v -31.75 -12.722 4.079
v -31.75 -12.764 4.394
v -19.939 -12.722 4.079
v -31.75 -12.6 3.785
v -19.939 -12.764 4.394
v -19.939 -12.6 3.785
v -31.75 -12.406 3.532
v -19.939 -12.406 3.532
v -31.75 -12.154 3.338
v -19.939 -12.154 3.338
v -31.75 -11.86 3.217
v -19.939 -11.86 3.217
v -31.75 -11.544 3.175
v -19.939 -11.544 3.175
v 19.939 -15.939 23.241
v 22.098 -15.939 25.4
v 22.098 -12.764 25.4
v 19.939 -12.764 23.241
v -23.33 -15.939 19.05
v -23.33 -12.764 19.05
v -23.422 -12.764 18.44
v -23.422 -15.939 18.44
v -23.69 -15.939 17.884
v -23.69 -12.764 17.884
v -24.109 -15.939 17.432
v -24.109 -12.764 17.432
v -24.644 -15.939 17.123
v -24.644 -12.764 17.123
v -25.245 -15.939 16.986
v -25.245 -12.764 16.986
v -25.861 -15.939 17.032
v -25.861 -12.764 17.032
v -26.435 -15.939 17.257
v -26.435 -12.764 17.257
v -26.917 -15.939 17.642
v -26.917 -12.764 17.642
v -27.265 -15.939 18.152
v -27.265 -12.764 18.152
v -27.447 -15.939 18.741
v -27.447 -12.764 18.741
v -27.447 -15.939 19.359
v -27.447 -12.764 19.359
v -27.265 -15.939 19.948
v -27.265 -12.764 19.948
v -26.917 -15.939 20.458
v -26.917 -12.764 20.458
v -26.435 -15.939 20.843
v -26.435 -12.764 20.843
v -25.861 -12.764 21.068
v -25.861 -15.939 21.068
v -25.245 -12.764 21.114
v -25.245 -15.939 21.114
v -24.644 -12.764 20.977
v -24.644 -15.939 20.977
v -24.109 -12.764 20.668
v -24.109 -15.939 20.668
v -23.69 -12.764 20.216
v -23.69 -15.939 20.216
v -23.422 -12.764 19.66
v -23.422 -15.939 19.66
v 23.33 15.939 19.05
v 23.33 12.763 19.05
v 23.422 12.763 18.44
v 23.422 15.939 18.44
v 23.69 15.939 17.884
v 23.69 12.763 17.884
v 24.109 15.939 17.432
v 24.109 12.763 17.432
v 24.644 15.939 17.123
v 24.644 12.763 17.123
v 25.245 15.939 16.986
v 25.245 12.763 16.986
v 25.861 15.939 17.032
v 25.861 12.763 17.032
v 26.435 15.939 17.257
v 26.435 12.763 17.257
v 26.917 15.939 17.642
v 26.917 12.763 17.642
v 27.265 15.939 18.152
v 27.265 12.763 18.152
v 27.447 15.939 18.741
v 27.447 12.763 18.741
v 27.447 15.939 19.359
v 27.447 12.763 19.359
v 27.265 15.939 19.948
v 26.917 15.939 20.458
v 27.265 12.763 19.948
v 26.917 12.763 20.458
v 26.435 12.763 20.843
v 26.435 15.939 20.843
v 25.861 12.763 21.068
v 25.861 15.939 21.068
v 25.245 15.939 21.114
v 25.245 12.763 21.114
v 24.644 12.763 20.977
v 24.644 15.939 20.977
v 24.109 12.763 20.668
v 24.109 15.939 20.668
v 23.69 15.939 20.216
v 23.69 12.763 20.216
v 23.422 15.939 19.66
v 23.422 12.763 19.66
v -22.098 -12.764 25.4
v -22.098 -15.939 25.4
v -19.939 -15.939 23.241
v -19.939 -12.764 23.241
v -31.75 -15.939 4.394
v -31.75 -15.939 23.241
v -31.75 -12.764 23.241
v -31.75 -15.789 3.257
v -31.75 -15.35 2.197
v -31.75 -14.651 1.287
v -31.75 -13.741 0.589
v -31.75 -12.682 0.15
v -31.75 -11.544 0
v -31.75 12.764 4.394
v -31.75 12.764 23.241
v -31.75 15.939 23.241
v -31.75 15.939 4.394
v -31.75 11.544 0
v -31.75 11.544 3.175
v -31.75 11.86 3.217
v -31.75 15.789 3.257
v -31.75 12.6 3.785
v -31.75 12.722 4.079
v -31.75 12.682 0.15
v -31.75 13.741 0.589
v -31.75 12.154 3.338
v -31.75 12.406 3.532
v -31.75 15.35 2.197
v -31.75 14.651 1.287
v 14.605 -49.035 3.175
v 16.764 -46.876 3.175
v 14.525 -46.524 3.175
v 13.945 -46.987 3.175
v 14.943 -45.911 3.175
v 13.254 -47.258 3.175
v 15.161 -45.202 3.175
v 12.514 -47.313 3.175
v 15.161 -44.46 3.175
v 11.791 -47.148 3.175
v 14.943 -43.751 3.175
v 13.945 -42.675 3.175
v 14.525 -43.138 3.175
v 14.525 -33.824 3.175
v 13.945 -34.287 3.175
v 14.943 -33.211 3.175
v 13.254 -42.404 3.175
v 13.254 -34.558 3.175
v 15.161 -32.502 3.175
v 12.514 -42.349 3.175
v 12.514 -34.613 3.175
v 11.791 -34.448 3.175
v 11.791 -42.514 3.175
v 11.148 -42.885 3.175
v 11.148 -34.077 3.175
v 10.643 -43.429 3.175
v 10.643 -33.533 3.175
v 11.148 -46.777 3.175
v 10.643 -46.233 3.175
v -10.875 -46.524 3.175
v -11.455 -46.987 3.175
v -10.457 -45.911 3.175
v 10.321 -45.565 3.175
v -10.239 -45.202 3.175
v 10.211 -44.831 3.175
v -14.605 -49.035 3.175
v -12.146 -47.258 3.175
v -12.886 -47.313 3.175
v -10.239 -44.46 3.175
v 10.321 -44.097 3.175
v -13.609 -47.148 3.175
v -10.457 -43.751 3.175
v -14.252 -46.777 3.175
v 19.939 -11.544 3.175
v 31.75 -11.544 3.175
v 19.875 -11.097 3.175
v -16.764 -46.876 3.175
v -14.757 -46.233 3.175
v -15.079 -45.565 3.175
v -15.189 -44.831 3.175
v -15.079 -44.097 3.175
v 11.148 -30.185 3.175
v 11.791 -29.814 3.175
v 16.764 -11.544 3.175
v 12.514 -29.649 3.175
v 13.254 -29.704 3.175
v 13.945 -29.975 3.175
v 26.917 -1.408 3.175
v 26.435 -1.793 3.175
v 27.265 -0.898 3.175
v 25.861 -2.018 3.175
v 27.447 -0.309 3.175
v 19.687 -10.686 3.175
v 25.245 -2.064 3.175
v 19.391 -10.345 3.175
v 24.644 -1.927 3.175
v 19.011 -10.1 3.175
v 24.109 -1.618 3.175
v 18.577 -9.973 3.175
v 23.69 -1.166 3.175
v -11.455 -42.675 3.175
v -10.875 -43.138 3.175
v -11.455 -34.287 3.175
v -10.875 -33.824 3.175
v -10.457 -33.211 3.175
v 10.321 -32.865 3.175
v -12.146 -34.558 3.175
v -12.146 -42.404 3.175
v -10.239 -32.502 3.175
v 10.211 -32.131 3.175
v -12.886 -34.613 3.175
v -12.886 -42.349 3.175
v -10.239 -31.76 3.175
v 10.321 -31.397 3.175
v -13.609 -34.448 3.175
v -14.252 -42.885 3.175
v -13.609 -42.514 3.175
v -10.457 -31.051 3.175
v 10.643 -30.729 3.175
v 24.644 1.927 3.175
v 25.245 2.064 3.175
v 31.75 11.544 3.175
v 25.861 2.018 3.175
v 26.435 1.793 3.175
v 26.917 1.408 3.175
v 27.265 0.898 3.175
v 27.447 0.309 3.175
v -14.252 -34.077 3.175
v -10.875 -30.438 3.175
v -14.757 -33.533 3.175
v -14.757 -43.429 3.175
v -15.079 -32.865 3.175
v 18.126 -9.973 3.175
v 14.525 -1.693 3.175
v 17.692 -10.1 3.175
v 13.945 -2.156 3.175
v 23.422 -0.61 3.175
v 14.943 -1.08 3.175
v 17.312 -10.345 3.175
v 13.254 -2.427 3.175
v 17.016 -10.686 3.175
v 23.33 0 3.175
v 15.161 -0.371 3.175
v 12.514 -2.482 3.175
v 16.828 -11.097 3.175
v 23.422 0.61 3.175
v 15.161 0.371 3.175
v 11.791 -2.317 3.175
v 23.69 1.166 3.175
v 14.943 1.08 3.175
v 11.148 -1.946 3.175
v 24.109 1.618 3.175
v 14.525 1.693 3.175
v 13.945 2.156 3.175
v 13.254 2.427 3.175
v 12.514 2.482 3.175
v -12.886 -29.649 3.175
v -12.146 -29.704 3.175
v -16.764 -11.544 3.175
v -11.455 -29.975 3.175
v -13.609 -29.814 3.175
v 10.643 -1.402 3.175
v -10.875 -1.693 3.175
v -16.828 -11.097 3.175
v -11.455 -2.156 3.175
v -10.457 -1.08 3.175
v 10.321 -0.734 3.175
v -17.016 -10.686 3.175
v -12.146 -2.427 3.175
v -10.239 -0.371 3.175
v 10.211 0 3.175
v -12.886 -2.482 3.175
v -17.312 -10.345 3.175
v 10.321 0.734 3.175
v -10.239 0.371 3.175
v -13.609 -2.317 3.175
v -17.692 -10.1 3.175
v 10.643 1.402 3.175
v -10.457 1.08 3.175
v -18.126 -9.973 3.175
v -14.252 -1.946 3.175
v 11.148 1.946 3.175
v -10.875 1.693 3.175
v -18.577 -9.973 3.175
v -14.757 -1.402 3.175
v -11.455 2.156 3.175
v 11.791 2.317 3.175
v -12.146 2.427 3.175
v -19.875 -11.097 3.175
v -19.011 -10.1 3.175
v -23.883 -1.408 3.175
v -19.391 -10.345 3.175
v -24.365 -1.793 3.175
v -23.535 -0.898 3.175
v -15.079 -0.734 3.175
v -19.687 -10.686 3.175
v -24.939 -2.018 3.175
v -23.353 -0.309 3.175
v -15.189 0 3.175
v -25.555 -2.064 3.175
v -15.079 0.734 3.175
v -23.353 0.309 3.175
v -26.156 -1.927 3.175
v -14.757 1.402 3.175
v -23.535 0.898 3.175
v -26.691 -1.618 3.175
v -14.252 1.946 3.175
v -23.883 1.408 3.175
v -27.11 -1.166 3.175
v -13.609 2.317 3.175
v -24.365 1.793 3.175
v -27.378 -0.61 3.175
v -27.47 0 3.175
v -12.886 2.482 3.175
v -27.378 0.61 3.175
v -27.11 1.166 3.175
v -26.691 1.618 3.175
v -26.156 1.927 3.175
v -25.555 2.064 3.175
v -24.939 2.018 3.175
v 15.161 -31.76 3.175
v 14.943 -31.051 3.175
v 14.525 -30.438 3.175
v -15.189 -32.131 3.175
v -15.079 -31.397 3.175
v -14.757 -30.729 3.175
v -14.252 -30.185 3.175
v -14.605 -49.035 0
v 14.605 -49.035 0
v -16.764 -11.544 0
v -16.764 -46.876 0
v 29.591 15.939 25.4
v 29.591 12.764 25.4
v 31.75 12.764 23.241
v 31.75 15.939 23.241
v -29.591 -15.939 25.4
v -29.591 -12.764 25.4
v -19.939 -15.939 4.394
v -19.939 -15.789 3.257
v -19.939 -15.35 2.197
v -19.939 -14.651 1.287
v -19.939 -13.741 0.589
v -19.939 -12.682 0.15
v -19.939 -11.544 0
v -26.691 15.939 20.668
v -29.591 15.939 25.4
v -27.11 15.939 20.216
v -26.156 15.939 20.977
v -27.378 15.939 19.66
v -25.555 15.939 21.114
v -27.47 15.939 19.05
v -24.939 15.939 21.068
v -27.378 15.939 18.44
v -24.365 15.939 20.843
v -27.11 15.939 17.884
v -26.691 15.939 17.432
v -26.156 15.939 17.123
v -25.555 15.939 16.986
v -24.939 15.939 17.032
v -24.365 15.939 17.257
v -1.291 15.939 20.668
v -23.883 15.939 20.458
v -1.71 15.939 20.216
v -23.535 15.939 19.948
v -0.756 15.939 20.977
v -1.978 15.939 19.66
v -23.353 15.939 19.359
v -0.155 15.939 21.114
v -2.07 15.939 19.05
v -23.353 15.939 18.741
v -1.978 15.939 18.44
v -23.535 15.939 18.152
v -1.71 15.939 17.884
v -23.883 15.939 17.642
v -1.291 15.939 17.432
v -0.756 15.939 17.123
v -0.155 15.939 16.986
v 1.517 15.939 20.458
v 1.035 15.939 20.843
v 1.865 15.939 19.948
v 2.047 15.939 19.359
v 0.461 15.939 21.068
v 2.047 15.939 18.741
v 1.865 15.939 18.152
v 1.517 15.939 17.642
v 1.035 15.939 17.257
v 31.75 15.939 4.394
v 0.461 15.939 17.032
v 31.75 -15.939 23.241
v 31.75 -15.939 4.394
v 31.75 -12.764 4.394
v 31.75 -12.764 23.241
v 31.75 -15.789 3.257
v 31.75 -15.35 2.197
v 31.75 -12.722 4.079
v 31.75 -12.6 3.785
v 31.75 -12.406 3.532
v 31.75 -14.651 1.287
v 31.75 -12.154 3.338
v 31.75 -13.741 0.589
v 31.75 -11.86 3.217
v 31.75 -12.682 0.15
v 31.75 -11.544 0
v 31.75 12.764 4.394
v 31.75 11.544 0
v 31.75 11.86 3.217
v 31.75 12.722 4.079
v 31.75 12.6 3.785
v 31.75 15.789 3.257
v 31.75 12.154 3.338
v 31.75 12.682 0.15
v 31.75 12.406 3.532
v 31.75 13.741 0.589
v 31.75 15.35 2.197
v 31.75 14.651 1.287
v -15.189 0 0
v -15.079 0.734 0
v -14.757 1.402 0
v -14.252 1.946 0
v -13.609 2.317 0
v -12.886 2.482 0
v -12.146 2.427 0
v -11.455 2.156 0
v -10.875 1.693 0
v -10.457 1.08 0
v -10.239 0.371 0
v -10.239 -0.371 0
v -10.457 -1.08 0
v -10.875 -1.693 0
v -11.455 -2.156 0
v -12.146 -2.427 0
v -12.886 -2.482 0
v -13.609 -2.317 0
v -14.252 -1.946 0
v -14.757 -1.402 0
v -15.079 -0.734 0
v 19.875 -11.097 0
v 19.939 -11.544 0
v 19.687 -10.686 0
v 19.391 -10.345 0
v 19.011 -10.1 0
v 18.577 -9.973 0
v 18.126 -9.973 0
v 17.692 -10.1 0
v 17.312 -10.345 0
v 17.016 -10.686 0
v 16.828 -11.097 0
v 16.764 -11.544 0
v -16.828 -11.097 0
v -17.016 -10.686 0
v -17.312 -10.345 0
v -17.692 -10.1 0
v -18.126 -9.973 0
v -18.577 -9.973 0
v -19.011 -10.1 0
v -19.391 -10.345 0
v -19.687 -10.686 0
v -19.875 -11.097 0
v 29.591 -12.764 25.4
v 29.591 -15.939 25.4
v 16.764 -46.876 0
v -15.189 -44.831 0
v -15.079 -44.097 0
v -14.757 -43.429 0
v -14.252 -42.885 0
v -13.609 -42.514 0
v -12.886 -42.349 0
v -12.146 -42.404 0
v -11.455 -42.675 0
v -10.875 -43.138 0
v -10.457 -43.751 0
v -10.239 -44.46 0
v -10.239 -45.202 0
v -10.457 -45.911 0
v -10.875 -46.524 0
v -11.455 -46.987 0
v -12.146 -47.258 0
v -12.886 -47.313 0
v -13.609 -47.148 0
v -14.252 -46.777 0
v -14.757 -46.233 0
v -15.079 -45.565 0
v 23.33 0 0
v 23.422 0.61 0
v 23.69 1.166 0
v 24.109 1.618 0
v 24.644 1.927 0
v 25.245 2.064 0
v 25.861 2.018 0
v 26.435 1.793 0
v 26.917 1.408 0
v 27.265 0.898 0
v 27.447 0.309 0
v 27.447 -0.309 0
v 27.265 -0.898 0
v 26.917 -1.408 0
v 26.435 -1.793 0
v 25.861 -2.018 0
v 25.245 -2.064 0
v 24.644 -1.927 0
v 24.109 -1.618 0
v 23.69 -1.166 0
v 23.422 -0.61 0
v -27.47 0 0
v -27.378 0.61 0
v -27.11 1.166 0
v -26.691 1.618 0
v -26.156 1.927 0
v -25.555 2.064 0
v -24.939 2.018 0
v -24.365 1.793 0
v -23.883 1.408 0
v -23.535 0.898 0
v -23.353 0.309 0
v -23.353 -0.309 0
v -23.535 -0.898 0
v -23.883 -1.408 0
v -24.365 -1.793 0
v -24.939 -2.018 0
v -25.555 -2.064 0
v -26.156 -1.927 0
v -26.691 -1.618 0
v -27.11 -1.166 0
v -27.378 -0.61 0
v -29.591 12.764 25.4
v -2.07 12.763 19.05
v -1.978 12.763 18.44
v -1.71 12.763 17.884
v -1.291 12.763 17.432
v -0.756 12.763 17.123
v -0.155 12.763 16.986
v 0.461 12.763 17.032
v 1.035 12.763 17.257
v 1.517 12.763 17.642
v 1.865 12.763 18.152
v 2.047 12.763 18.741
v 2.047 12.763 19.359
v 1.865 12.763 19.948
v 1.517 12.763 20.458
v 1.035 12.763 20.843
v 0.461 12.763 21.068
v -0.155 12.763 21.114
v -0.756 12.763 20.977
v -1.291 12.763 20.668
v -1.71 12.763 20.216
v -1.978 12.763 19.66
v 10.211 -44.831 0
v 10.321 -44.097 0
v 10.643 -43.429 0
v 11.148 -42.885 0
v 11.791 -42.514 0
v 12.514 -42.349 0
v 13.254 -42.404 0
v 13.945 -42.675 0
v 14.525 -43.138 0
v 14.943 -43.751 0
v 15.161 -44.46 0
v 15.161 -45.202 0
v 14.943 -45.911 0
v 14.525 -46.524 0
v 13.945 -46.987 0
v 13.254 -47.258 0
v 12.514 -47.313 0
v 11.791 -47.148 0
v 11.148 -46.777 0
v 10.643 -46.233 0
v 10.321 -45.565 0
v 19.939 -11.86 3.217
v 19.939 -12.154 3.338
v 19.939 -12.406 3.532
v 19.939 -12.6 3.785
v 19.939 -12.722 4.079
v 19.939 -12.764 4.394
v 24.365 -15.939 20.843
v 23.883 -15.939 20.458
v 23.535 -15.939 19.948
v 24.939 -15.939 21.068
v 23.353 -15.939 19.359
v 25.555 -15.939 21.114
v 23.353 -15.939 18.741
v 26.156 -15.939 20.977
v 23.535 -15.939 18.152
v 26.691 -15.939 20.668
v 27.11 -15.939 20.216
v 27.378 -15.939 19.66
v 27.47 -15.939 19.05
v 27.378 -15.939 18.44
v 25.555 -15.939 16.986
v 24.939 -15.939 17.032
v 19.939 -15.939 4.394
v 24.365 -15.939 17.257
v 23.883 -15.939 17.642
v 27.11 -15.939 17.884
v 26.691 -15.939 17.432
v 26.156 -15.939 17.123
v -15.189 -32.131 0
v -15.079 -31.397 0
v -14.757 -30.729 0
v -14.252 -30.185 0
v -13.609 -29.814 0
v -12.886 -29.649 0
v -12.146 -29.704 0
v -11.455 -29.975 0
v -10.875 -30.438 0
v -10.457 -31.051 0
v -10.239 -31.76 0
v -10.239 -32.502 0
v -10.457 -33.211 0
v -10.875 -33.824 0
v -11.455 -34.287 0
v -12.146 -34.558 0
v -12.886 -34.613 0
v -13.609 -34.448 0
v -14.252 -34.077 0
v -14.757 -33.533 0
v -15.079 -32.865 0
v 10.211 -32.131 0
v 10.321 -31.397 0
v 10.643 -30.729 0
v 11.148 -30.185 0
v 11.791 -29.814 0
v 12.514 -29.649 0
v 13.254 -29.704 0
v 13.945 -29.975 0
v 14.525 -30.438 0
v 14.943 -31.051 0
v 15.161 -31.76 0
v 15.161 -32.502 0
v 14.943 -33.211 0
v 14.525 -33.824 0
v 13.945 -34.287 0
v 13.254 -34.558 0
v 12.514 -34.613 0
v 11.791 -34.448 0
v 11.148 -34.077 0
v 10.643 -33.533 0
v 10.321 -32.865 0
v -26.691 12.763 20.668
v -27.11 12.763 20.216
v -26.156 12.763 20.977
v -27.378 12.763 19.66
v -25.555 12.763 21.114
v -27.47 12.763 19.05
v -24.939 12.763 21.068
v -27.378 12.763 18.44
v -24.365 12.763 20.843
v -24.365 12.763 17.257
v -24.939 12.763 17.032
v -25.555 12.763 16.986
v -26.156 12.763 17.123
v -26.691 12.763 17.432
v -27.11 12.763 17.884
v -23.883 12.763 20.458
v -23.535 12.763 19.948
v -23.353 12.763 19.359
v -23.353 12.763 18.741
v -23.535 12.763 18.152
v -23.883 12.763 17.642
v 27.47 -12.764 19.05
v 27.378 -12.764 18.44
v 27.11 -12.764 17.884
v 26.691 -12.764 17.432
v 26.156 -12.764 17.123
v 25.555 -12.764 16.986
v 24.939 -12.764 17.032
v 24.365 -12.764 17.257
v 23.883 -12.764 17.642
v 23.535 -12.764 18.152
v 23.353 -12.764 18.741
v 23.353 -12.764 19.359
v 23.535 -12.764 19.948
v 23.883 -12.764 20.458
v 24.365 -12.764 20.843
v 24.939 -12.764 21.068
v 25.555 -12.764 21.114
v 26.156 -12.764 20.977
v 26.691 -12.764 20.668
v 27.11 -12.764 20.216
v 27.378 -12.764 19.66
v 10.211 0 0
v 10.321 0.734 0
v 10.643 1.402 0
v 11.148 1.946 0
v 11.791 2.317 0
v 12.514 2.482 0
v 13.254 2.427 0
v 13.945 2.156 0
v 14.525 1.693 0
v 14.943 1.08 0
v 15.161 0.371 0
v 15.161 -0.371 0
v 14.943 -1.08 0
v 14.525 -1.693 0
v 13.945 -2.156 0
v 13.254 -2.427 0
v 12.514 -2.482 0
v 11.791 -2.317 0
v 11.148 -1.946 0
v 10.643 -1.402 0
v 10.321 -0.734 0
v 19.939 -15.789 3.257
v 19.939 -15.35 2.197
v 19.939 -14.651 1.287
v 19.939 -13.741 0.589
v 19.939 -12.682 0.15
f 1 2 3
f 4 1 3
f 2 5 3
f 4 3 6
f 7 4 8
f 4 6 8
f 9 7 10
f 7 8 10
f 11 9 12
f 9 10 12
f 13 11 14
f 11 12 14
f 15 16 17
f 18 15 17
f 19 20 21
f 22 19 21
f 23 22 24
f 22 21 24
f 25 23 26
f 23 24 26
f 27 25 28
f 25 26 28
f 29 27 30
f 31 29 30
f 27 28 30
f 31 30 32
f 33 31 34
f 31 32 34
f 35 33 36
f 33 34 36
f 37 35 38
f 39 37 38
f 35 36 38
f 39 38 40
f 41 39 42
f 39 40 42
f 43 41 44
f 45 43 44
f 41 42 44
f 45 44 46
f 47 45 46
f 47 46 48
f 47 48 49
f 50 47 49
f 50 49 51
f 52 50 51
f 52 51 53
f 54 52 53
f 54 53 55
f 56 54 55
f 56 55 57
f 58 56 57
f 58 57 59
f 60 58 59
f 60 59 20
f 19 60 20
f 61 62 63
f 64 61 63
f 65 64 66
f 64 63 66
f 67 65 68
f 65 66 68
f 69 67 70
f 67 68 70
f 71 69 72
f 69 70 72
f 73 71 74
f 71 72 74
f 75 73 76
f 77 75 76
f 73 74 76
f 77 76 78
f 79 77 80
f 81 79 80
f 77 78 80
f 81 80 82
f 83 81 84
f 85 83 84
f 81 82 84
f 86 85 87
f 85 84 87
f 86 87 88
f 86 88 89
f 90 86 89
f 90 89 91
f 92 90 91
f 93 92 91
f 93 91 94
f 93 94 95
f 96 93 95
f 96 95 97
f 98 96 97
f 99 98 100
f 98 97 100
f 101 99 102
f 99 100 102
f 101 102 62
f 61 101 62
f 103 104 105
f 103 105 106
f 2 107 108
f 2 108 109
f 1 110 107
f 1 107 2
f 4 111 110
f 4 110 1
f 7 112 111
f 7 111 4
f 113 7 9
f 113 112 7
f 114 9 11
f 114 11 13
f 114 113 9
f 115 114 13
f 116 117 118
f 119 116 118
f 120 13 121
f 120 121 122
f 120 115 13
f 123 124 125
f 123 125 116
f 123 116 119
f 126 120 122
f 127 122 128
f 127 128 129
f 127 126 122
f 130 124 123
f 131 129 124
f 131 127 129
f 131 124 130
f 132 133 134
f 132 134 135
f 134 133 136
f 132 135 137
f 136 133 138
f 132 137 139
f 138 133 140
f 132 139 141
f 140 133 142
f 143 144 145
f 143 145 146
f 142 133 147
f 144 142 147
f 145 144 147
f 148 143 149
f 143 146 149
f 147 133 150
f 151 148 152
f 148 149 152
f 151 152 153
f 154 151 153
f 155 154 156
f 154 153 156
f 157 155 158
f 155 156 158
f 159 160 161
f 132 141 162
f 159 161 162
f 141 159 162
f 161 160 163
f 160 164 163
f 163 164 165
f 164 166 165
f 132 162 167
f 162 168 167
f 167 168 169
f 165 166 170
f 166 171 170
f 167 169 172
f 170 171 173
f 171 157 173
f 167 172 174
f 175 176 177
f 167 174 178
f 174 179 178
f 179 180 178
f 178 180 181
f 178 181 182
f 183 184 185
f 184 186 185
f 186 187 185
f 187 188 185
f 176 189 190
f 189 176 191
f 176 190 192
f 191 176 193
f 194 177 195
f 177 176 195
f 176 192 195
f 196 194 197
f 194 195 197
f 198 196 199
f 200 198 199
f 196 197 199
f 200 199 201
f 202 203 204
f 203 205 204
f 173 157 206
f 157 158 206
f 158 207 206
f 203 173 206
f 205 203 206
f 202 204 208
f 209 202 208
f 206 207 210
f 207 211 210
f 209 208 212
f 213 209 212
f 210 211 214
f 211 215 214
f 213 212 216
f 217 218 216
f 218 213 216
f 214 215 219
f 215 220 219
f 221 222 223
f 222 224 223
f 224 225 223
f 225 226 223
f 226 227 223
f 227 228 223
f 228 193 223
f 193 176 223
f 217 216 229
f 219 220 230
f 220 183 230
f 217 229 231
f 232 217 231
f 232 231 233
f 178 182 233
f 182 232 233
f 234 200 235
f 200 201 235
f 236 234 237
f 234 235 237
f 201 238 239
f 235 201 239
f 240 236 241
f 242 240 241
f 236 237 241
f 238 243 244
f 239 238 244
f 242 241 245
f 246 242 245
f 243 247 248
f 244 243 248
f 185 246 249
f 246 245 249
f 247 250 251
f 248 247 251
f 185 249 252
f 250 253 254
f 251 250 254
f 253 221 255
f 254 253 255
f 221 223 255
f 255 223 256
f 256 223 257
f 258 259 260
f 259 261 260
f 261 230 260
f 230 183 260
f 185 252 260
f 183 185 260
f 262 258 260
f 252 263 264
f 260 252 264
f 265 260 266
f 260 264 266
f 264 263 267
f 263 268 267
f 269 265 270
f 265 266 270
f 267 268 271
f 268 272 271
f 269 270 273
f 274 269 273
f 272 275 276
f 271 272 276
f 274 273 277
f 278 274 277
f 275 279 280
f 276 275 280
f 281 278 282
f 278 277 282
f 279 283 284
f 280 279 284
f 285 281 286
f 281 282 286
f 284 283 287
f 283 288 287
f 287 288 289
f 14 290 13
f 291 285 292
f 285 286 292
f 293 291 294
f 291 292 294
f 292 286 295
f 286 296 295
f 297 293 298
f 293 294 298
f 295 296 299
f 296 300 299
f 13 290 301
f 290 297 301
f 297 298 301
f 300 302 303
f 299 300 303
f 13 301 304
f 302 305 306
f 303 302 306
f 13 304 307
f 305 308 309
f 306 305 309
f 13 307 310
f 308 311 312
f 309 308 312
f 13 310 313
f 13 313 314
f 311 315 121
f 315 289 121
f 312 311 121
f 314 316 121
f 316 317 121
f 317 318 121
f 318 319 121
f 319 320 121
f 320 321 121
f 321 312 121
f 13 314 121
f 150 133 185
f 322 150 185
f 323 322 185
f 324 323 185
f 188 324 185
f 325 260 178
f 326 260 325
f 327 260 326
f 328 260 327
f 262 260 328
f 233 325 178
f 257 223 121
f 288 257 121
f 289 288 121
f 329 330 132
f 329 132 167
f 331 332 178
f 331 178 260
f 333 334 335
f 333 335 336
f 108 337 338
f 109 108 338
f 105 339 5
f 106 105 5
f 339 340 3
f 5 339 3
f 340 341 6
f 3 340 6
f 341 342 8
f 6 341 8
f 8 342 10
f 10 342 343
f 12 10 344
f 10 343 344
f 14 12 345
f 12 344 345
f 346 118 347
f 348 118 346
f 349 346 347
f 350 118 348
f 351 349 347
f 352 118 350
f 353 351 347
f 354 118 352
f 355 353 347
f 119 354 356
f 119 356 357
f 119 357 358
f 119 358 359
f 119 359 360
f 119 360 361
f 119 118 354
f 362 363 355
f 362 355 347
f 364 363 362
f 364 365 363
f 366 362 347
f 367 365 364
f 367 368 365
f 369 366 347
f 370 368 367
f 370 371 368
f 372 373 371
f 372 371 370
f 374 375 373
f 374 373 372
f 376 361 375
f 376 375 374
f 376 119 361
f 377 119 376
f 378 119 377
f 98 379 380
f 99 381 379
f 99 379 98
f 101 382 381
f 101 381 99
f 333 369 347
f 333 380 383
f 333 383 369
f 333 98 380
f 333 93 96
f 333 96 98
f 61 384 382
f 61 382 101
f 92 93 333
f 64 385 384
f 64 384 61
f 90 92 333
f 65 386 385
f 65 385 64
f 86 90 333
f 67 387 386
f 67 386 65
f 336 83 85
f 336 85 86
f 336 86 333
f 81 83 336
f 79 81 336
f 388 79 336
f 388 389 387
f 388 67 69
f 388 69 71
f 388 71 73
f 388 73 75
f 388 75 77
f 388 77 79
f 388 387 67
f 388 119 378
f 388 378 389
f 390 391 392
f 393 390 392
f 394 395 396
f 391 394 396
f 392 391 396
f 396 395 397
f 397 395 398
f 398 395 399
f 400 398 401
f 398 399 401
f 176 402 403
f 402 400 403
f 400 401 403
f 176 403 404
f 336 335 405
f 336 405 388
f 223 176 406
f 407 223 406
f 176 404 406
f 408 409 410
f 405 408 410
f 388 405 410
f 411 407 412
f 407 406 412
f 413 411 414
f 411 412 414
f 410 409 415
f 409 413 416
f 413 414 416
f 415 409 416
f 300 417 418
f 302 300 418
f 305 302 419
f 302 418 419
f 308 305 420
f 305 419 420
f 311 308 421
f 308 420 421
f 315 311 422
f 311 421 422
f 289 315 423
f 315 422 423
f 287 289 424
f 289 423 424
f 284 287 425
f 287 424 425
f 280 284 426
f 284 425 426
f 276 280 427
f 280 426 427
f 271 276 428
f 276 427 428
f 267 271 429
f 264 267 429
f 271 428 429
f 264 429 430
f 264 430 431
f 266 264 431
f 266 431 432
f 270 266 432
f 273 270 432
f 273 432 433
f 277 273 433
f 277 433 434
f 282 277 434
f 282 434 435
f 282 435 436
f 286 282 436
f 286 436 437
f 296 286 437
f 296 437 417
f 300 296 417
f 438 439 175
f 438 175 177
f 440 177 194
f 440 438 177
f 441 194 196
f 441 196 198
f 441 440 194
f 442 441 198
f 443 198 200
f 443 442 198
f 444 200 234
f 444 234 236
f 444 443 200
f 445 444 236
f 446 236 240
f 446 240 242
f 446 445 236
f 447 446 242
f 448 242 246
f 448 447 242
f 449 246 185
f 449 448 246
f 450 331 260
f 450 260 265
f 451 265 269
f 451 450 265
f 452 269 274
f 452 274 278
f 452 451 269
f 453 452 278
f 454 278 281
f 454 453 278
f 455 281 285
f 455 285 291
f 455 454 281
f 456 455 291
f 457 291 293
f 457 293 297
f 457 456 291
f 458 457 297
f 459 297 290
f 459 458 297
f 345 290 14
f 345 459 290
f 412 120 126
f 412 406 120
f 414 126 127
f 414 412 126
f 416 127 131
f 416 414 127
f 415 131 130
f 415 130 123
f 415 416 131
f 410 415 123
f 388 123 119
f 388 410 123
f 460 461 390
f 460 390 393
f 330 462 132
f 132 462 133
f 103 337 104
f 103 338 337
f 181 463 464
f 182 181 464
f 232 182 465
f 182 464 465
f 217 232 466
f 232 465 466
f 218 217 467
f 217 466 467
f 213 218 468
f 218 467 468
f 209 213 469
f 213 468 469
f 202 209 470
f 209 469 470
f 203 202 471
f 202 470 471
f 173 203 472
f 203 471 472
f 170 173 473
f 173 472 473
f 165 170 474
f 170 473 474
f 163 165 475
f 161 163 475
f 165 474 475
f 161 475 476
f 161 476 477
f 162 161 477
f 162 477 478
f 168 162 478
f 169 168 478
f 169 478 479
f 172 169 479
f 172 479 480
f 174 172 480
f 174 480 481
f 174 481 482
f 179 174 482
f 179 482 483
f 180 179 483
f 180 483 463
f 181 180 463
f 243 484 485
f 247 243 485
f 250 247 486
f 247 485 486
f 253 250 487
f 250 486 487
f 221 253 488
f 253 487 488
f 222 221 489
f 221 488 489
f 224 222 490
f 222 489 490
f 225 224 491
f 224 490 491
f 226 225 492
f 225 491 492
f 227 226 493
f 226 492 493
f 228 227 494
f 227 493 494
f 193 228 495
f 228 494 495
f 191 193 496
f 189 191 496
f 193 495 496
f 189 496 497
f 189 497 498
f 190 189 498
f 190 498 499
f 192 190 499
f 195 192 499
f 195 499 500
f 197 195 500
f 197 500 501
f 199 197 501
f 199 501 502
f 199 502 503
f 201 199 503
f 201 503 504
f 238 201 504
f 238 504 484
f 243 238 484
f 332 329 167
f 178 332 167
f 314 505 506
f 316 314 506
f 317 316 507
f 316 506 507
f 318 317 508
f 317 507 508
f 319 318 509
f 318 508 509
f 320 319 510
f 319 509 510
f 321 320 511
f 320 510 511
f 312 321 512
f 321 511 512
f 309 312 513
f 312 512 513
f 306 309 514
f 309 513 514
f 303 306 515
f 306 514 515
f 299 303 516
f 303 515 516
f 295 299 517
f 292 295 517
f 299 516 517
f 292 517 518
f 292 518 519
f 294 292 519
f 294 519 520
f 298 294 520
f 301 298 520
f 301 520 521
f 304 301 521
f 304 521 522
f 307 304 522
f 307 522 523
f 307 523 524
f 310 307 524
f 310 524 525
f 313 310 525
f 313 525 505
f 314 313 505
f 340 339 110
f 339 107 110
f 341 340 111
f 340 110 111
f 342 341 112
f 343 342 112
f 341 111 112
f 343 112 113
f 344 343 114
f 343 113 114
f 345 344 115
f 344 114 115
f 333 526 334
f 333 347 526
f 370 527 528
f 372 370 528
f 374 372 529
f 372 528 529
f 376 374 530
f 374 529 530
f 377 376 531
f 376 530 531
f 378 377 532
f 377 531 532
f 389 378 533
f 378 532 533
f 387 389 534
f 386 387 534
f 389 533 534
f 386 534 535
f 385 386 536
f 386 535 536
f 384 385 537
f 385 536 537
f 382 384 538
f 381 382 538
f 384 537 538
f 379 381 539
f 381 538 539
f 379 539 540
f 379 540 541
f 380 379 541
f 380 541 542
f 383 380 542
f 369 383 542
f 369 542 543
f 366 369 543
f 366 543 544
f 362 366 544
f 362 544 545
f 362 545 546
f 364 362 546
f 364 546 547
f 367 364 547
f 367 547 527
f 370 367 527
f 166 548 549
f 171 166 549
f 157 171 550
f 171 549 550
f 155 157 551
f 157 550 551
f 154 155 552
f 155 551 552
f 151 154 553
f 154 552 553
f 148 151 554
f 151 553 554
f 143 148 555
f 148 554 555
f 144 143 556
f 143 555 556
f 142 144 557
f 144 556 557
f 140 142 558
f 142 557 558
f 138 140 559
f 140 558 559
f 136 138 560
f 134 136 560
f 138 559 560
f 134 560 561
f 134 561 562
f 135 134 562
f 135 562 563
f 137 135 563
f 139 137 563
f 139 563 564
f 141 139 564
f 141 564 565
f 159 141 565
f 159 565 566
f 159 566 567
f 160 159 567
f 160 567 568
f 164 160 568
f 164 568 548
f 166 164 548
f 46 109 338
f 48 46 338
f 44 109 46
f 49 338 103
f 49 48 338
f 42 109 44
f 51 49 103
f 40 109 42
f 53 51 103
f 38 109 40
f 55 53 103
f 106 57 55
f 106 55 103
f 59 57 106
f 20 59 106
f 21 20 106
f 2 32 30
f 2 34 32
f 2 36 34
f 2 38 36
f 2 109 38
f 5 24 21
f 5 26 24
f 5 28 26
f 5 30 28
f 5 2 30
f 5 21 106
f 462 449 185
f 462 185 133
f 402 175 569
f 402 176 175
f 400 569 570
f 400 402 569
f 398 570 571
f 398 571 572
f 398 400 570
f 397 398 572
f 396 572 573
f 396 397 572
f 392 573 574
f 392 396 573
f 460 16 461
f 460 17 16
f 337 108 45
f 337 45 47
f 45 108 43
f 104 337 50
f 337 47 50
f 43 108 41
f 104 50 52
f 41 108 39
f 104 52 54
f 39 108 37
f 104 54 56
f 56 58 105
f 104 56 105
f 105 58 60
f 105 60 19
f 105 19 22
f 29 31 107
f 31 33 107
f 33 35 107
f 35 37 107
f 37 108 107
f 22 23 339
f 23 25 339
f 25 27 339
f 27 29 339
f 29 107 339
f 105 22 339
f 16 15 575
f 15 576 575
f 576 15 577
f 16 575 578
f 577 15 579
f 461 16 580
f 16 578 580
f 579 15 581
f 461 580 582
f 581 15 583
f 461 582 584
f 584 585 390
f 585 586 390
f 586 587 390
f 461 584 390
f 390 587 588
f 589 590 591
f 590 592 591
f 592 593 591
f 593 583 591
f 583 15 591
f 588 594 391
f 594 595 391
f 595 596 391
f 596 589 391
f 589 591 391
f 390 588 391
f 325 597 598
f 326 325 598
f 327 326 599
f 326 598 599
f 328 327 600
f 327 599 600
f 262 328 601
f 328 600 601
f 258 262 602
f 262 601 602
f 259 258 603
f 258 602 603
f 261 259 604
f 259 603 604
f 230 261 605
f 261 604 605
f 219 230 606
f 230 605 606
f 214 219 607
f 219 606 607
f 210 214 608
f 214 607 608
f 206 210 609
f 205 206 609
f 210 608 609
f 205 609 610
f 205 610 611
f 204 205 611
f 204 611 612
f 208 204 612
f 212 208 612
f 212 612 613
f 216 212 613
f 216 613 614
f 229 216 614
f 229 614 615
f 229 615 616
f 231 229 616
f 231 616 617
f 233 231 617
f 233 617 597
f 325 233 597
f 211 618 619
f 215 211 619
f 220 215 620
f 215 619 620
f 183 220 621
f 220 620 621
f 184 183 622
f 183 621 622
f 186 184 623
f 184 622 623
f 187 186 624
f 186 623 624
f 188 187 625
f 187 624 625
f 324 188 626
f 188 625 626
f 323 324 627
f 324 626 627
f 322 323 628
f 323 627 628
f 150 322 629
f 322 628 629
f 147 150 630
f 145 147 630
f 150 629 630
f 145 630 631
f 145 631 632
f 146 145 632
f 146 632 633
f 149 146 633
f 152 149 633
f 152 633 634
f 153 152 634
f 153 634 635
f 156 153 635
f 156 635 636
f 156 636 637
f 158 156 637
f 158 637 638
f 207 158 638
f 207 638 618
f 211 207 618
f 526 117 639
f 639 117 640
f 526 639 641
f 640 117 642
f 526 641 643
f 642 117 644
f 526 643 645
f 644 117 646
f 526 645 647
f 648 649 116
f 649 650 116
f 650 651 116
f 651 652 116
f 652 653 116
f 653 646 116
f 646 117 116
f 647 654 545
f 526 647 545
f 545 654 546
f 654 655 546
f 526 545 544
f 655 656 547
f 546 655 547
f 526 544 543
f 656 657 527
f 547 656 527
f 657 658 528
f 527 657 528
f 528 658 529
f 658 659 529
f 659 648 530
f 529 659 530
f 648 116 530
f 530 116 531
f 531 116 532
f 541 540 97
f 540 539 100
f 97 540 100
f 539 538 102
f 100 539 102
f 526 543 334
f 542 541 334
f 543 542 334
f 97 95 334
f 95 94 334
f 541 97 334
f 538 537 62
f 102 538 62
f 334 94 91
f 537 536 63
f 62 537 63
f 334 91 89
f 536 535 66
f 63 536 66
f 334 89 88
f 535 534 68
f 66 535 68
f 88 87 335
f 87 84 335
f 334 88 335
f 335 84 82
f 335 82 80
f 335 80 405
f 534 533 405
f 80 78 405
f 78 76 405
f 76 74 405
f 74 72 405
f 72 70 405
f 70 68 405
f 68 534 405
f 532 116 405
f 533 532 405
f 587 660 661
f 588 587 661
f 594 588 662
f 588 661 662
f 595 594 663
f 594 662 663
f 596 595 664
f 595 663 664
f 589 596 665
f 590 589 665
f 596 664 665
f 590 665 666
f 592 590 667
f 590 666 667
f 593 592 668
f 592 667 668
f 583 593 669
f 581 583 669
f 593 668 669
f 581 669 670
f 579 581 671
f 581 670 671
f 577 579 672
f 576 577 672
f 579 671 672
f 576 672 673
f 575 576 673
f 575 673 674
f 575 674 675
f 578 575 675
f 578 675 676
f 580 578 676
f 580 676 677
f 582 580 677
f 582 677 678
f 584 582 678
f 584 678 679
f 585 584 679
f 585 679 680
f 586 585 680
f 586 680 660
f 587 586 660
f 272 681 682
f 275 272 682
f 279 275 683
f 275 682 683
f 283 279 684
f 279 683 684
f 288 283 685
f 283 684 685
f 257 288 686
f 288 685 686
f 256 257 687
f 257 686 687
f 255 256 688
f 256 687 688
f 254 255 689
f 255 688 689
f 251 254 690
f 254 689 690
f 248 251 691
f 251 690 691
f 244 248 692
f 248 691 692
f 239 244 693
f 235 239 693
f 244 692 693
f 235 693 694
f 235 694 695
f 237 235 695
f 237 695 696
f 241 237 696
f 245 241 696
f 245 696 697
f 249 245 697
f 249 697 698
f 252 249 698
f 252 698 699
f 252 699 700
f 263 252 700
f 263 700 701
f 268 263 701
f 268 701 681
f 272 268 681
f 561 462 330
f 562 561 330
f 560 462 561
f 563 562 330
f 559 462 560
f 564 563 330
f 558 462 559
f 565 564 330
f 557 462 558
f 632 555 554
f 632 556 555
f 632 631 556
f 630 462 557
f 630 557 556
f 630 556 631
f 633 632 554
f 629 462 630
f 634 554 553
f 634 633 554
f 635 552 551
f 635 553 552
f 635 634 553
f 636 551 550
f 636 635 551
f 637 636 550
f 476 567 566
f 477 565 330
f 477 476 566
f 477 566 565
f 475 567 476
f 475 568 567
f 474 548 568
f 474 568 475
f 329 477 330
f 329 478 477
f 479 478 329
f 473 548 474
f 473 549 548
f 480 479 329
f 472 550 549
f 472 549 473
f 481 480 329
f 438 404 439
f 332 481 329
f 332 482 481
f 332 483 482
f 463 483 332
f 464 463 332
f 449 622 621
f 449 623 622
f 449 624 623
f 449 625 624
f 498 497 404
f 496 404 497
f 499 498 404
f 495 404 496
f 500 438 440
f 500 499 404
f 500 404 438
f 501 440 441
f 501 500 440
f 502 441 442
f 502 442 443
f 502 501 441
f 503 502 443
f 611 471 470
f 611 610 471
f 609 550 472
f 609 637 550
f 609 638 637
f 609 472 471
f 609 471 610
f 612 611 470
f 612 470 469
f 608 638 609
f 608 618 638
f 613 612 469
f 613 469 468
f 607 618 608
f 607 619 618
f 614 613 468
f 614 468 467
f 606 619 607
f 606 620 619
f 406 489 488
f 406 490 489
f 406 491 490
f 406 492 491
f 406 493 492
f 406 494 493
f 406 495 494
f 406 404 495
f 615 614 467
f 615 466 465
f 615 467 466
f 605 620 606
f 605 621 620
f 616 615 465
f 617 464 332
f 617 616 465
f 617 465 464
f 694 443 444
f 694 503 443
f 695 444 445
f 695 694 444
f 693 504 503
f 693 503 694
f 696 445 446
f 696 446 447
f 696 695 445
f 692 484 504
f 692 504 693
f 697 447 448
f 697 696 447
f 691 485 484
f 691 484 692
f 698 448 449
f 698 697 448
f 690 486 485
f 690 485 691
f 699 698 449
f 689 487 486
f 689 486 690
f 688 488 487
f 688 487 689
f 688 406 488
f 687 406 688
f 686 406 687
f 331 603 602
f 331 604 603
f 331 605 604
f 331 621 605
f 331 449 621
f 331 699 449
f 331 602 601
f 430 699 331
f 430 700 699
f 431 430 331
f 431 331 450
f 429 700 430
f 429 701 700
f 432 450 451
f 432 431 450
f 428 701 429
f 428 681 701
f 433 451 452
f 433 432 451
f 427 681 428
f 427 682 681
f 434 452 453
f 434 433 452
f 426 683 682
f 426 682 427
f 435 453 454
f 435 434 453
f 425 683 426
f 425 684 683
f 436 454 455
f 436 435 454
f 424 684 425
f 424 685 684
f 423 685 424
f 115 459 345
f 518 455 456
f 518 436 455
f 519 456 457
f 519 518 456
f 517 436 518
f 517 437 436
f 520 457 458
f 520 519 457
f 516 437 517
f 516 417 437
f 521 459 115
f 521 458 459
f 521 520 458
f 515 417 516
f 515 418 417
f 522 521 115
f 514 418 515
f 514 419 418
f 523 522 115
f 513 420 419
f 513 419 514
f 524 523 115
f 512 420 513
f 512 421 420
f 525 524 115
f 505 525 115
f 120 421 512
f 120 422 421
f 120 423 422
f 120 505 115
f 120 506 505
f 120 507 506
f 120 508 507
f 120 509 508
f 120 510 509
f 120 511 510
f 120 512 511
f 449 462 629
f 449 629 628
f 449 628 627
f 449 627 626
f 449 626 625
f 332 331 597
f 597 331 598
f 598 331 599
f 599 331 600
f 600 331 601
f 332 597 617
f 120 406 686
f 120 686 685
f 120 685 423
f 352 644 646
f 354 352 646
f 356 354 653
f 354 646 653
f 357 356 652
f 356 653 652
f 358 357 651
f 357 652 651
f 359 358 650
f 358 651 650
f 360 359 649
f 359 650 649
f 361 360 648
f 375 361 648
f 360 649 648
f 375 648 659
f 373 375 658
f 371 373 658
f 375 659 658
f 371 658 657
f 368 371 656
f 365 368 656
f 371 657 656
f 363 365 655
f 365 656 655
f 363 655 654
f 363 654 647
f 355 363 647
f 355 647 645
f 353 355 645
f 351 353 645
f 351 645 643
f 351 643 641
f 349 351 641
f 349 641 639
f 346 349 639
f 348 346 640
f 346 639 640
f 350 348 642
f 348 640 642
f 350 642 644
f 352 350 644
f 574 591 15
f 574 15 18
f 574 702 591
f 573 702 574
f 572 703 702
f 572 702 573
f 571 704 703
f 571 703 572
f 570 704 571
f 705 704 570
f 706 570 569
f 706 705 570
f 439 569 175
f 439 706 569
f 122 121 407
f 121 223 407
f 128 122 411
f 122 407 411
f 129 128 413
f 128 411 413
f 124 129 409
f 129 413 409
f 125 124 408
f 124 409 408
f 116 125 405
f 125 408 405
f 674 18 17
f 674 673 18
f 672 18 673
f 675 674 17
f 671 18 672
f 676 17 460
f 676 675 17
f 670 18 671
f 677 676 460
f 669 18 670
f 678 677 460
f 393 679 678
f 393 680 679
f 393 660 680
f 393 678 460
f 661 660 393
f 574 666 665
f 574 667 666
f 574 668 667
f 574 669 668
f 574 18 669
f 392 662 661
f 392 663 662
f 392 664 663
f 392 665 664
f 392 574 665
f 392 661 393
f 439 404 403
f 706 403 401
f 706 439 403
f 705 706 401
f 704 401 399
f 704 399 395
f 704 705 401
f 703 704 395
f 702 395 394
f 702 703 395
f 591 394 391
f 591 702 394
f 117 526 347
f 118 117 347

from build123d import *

# Parameters (mm, degrees)
BOSS_EXTRUDE1_DEPTH        = 3.175
SKETCH2_W                  = 63.5
SKETCH2_H                  = 3.175
BOSS_EXTRUDE2_DEPTH        = 22.225
SKETCH3_W                  = 11.811
SKETCH3_H                  = 3.175
BOSS_EXTRUDE3_DEPTH        = 22.225
SKETCH4_W                  = 11.811
SKETCH4_H                  = 3.175
BOSS_EXTRUDE4_DEPTH        = 22.225
HOLE1_D                    = 4.9784
HOLE1_DEPTH                = 3.175
M3_5_CLEARANCE_HOLE1_D     = 4.1402
M3_5_CLEARANCE_HOLE1_DEPTH = 3.175
M3_5_CLEARANCE_HOLE2_D     = 4.1402
M3_5_CLEARANCE_HOLE2_DEPTH = 3.175
M3_5_CLEARANCE_HOLE3_D     = 4.1402
M3_5_CLEARANCE_HOLE3_DEPTH = 31.877
CHAMFER1_SIZE              = 2.159
FILLET1_R                  = 1.2192
FILLET2_R                  = 4.3942


with BuildPart() as part:
    # Sketch1 → Boss-Extrude1 (new body)
    with BuildSketch(Plane(origin=(0, 0, 0), x_dir=(-1, 0, 0), z_dir=(0, 0, -1))):
        with BuildLine():
            Line((-16.764, -49.0347), (16.764, -49.0347))
            Line((16.764, -49.0347), (16.764, -11.5443))
            ThreePointArc((16.764, -11.5443), (18.3515, -9.9568), (19.939, -11.5443))
            Line((19.939, -11.5443), (19.939, -15.9385))
            Line((19.939, -15.9385), (31.75, -15.9385))
            Line((31.75, -15.9385), (31.75, 15.9385))
            Line((31.75, 15.9385), (-31.75, 15.9385))
            Line((-31.75, 15.9385), (-31.75, -15.9385))
            Line((-31.75, -15.9385), (-19.939, -15.9385))
            Line((-19.939, -15.9385), (-19.939, -11.5443))
            ThreePointArc((-19.939, -11.5443), (-18.3515, -9.9568), (-16.764, -11.5443))
            Line((-16.764, -11.5443), (-16.764, -49.0347))
        make_face()
    extrude(amount=-BOSS_EXTRUDE1_DEPTH)

    # Sketch2 → Boss-Extrude2 (add)
    with BuildSketch(Plane.XY.offset(3.175)):
        with Locations((0, 14.351)):
            Rectangle(SKETCH2_W, SKETCH2_H)
    extrude(amount=BOSS_EXTRUDE2_DEPTH)

    # Sketch3 → Boss-Extrude3 (add)
    with BuildSketch(Plane.XY.offset(3.175)):
        with Locations((25.8445, -14.351)):
            Rectangle(SKETCH3_W, SKETCH3_H)
    extrude(amount=BOSS_EXTRUDE3_DEPTH)

    # Sketch4 → Boss-Extrude4 (add)
    with BuildSketch(Plane.XY.offset(3.175)):
        with Locations((-25.8445, -14.351)):
            Rectangle(SKETCH4_W, SKETCH4_H)
    extrude(amount=BOSS_EXTRUDE4_DEPTH)

    # Hole1
    with Locations(Plane.XY.offset(3.175)):
        with Locations((12.7, -44.831), (-12.7, -44.831), (-12.7, -32.131), (12.7, -32.131), (-12.7, 0), (12.7, 0)):
            Hole(HOLE1_D / 2, depth=HOLE1_DEPTH)

    # M3.5 Clearance Hole1
    with Locations(Plane.XY.offset(3.175)):
        with Locations((-25.4, 0), (25.4, 0)):
            Hole(M3_5_CLEARANCE_HOLE1_D / 2, depth=M3_5_CLEARANCE_HOLE1_DEPTH)

    # M3.5 Clearance Hole2
    with Locations(Plane(origin=(0, 15.9385, 0), x_dir=(1, 0, 0), z_dir=(0, 1, 0))):
        with Locations((25.4, -19.05), (0, -19.05), (-25.4, -19.05)):
            Hole(M3_5_CLEARANCE_HOLE2_D / 2, depth=M3_5_CLEARANCE_HOLE2_DEPTH)

    # M3.5 Clearance Hole3
    with Locations(Plane(origin=(0, -15.9385, 0), x_dir=(-1, 0, 0), z_dir=(0, -1, 0))):
        with Locations((-25.4, -19.05), (25.4, -19.05)):
            Hole(M3_5_CLEARANCE_HOLE3_D / 2, depth=M3_5_CLEARANCE_HOLE3_DEPTH)

    # Chamfer1
    chamfer1_edges = [part.edges().sort_by_distance(p)[0] for p in [
        (-19.939, -14.351, 25.4),
        (31.75, 14.351, 25.4),
        (31.75, -14.351, 25.4),
        (16.764, -49.0347, 1.5875),
        (-31.75, 14.351, 25.4),
        (-31.75, -14.351, 25.4),
        (19.939, -14.351, 25.4),
        (-16.764, -49.0347, 1.5875),
    ]]
    chamfer(chamfer1_edges, length=CHAMFER1_SIZE)

    # Fillet1
    fillet1_edges = [part.edges().sort_by_distance(p)[0] for p in [
        (25.8445, -12.7635, 3.175),
        (-25.8445, -12.7635, 3.175),
        (0, 12.7635, 3.175),
    ]]
    fillet(fillet1_edges, radius=FILLET1_R)

    # Fillet2
    fillet2_edges = [part.edges().sort_by_distance(p)[0] for p in [
        (25.8445, -15.9385, 0),
        (-25.8445, -15.9385, 0),
        (0, 15.9385, 0),
    ]]
    fillet(fillet2_edges, radius=FILLET2_R)


solid = part.part
